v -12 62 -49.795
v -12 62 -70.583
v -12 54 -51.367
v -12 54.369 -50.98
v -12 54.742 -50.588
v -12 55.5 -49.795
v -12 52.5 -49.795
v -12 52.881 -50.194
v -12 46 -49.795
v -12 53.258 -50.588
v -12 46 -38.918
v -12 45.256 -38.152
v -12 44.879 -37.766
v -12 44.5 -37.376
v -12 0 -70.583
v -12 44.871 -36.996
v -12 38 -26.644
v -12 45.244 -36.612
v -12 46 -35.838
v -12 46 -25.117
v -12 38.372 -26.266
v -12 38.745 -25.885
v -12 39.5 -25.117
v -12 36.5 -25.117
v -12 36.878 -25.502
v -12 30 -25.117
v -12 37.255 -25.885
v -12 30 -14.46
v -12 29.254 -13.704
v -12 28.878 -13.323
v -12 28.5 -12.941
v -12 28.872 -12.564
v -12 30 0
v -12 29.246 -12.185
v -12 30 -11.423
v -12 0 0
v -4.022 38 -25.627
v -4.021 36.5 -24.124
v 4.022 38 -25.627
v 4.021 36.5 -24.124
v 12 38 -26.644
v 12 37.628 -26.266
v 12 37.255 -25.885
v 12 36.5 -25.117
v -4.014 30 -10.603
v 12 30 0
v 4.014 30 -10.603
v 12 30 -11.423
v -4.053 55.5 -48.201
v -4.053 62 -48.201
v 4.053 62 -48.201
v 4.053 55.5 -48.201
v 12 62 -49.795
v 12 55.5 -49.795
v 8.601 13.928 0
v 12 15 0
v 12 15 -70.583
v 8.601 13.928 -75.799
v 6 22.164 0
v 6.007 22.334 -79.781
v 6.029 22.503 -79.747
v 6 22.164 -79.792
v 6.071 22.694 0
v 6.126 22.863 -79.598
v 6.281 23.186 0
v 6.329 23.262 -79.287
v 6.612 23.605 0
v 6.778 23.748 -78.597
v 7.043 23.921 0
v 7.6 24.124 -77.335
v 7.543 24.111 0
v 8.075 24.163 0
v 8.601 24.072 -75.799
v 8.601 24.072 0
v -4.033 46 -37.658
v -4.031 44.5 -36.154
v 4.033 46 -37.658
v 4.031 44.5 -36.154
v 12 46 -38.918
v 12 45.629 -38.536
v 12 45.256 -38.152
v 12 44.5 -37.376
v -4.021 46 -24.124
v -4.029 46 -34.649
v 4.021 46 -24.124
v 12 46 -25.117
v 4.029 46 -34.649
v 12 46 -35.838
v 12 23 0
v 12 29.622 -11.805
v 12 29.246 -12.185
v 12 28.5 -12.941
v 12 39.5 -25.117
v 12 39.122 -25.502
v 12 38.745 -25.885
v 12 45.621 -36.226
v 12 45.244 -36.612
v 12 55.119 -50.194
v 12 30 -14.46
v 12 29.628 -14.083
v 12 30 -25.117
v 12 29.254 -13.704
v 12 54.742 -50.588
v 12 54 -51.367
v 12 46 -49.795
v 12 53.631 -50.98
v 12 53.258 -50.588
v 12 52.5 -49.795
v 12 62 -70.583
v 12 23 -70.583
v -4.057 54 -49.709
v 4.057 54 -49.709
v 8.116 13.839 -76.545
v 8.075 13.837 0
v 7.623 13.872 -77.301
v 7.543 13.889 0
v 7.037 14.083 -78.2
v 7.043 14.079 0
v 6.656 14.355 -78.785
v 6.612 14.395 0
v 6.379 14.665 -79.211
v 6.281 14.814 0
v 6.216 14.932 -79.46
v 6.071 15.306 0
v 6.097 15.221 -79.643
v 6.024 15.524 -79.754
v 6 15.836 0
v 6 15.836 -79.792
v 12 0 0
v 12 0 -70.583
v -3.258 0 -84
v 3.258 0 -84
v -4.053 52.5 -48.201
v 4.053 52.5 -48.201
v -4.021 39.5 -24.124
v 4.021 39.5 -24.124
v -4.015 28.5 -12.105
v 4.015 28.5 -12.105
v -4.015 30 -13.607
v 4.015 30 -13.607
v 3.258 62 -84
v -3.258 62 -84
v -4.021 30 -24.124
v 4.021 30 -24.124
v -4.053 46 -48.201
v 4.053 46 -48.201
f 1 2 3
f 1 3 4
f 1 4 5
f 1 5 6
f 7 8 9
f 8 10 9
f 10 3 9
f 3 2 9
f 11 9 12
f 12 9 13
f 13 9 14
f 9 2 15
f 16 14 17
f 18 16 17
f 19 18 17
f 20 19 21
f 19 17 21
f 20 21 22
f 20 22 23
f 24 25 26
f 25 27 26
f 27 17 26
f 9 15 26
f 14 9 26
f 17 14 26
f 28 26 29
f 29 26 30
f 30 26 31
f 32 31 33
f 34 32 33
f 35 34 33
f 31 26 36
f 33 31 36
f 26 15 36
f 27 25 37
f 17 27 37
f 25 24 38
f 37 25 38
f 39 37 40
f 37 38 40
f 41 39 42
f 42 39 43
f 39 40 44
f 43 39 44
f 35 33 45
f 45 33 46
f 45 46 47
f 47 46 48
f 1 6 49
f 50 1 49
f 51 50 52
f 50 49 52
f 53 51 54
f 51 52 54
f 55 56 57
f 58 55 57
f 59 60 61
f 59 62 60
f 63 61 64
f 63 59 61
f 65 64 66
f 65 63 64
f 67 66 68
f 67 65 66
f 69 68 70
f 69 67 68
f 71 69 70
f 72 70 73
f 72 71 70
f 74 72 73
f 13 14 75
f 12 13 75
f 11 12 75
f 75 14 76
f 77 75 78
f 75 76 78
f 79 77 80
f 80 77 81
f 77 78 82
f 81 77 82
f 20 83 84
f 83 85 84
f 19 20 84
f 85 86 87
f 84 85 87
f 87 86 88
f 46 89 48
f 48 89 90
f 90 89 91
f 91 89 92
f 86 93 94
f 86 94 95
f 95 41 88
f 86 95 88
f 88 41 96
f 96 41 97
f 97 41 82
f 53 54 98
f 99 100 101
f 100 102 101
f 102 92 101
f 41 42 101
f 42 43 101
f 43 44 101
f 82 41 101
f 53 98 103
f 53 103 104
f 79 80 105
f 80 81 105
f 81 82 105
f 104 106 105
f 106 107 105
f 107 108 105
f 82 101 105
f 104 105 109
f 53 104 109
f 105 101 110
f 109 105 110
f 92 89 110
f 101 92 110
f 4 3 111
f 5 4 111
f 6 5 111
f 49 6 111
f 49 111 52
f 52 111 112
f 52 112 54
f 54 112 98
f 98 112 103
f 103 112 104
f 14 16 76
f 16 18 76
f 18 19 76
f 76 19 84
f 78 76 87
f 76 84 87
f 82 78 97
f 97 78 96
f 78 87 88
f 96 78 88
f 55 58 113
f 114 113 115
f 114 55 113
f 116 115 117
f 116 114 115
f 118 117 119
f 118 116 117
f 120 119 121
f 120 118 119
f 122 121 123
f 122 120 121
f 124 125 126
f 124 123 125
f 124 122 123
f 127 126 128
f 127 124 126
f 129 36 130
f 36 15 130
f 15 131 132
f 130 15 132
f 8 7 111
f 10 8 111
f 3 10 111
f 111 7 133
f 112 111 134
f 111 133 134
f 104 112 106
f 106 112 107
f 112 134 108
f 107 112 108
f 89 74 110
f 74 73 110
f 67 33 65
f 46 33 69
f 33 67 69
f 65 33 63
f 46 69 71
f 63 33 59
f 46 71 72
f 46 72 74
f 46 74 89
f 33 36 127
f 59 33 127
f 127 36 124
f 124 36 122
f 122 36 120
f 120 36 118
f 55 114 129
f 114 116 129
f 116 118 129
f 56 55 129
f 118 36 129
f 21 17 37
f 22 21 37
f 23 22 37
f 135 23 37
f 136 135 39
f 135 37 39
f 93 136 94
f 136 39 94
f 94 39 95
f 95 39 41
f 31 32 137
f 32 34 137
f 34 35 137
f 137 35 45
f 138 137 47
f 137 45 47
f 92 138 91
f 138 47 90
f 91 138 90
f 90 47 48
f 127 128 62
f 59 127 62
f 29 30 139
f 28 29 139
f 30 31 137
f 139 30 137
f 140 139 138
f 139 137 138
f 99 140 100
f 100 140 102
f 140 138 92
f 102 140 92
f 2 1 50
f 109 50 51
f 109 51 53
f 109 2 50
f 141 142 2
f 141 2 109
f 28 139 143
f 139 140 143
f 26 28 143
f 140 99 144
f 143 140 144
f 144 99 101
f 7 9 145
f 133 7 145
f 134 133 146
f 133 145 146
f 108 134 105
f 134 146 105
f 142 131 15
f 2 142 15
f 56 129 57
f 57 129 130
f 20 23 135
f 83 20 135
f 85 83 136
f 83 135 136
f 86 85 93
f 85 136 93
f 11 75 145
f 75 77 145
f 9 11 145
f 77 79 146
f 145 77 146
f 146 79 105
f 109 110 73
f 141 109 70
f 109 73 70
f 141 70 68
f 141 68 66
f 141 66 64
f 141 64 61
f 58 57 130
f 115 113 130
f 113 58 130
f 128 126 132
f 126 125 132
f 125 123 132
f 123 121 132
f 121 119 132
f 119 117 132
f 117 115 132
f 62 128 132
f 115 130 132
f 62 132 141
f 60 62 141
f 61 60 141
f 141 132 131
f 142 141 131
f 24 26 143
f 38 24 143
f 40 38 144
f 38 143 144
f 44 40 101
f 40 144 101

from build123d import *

# Parameters (mm, degrees)
BOSS_EXTRUDE1_DEPTH = 62
CUT_EXTRUDE1_DEPTH  = 106.090437243


with BuildPart() as part:
    # Sketch1 → Boss-Extrude1 (new body)
    with BuildSketch(Plane(origin=(0, 0, 0), x_dir=(1, 0, 0), z_dir=(0, 1, 0))):
        Polygon((-12, 0), (12, 0), (12, 70.583238925), (3.257901851, 84), (-3.257901851, 84), (-12, 70.583238925), align=None)
    extrude(amount=BOSS_EXTRUDE1_DEPTH)

    # Sketch2 → Cut-Revolve4 (revolve, cut)
    with BuildSketch(Plane(origin=(0, 0, 0), x_dir=(0, 0, -1), z_dir=(1, 0, 0))):
        Polygon((48, 55.5), (49.5, 54), (48, 52.5), (48, 46), (37.5, 46), (36, 44.5), (34.5, 46), (24, 46), (24, 39.5), (25.5, 38), (24, 36.5), (24, 30), (13.5, 30), (12, 28.5), (10.5, 30), (-12, 30), (-12, 70), (48, 70), align=None)
    revolve(axis=Axis((0, 0, -89), (0, 1, 0)), mode=Mode.SUBTRACT)

    # Sketch3 → Cut-Extrude1 (cut, through all)
    with BuildSketch(Plane.XY):
        with BuildLine():
            Line((12, 15), (8.601411599, 13.928429193))
            ThreePointArc((8.601411599, 13.928429193), (6.817380703, 14.222973886), (6, 15.835863095))
            Line((6, 15.835863095), (6, 22.164136905))
            ThreePointArc((6, 22.164136905), (6.817380703, 23.777026114), (8.601411599, 24.071570807))
            Line((8.601411599, 24.071570807), (12, 23))
            Line((12, 23), (12, 15))
        make_face()
    extrude(amount=-CUT_EXTRUDE1_DEPTH, mode=Mode.SUBTRACT)


solid = part.part
